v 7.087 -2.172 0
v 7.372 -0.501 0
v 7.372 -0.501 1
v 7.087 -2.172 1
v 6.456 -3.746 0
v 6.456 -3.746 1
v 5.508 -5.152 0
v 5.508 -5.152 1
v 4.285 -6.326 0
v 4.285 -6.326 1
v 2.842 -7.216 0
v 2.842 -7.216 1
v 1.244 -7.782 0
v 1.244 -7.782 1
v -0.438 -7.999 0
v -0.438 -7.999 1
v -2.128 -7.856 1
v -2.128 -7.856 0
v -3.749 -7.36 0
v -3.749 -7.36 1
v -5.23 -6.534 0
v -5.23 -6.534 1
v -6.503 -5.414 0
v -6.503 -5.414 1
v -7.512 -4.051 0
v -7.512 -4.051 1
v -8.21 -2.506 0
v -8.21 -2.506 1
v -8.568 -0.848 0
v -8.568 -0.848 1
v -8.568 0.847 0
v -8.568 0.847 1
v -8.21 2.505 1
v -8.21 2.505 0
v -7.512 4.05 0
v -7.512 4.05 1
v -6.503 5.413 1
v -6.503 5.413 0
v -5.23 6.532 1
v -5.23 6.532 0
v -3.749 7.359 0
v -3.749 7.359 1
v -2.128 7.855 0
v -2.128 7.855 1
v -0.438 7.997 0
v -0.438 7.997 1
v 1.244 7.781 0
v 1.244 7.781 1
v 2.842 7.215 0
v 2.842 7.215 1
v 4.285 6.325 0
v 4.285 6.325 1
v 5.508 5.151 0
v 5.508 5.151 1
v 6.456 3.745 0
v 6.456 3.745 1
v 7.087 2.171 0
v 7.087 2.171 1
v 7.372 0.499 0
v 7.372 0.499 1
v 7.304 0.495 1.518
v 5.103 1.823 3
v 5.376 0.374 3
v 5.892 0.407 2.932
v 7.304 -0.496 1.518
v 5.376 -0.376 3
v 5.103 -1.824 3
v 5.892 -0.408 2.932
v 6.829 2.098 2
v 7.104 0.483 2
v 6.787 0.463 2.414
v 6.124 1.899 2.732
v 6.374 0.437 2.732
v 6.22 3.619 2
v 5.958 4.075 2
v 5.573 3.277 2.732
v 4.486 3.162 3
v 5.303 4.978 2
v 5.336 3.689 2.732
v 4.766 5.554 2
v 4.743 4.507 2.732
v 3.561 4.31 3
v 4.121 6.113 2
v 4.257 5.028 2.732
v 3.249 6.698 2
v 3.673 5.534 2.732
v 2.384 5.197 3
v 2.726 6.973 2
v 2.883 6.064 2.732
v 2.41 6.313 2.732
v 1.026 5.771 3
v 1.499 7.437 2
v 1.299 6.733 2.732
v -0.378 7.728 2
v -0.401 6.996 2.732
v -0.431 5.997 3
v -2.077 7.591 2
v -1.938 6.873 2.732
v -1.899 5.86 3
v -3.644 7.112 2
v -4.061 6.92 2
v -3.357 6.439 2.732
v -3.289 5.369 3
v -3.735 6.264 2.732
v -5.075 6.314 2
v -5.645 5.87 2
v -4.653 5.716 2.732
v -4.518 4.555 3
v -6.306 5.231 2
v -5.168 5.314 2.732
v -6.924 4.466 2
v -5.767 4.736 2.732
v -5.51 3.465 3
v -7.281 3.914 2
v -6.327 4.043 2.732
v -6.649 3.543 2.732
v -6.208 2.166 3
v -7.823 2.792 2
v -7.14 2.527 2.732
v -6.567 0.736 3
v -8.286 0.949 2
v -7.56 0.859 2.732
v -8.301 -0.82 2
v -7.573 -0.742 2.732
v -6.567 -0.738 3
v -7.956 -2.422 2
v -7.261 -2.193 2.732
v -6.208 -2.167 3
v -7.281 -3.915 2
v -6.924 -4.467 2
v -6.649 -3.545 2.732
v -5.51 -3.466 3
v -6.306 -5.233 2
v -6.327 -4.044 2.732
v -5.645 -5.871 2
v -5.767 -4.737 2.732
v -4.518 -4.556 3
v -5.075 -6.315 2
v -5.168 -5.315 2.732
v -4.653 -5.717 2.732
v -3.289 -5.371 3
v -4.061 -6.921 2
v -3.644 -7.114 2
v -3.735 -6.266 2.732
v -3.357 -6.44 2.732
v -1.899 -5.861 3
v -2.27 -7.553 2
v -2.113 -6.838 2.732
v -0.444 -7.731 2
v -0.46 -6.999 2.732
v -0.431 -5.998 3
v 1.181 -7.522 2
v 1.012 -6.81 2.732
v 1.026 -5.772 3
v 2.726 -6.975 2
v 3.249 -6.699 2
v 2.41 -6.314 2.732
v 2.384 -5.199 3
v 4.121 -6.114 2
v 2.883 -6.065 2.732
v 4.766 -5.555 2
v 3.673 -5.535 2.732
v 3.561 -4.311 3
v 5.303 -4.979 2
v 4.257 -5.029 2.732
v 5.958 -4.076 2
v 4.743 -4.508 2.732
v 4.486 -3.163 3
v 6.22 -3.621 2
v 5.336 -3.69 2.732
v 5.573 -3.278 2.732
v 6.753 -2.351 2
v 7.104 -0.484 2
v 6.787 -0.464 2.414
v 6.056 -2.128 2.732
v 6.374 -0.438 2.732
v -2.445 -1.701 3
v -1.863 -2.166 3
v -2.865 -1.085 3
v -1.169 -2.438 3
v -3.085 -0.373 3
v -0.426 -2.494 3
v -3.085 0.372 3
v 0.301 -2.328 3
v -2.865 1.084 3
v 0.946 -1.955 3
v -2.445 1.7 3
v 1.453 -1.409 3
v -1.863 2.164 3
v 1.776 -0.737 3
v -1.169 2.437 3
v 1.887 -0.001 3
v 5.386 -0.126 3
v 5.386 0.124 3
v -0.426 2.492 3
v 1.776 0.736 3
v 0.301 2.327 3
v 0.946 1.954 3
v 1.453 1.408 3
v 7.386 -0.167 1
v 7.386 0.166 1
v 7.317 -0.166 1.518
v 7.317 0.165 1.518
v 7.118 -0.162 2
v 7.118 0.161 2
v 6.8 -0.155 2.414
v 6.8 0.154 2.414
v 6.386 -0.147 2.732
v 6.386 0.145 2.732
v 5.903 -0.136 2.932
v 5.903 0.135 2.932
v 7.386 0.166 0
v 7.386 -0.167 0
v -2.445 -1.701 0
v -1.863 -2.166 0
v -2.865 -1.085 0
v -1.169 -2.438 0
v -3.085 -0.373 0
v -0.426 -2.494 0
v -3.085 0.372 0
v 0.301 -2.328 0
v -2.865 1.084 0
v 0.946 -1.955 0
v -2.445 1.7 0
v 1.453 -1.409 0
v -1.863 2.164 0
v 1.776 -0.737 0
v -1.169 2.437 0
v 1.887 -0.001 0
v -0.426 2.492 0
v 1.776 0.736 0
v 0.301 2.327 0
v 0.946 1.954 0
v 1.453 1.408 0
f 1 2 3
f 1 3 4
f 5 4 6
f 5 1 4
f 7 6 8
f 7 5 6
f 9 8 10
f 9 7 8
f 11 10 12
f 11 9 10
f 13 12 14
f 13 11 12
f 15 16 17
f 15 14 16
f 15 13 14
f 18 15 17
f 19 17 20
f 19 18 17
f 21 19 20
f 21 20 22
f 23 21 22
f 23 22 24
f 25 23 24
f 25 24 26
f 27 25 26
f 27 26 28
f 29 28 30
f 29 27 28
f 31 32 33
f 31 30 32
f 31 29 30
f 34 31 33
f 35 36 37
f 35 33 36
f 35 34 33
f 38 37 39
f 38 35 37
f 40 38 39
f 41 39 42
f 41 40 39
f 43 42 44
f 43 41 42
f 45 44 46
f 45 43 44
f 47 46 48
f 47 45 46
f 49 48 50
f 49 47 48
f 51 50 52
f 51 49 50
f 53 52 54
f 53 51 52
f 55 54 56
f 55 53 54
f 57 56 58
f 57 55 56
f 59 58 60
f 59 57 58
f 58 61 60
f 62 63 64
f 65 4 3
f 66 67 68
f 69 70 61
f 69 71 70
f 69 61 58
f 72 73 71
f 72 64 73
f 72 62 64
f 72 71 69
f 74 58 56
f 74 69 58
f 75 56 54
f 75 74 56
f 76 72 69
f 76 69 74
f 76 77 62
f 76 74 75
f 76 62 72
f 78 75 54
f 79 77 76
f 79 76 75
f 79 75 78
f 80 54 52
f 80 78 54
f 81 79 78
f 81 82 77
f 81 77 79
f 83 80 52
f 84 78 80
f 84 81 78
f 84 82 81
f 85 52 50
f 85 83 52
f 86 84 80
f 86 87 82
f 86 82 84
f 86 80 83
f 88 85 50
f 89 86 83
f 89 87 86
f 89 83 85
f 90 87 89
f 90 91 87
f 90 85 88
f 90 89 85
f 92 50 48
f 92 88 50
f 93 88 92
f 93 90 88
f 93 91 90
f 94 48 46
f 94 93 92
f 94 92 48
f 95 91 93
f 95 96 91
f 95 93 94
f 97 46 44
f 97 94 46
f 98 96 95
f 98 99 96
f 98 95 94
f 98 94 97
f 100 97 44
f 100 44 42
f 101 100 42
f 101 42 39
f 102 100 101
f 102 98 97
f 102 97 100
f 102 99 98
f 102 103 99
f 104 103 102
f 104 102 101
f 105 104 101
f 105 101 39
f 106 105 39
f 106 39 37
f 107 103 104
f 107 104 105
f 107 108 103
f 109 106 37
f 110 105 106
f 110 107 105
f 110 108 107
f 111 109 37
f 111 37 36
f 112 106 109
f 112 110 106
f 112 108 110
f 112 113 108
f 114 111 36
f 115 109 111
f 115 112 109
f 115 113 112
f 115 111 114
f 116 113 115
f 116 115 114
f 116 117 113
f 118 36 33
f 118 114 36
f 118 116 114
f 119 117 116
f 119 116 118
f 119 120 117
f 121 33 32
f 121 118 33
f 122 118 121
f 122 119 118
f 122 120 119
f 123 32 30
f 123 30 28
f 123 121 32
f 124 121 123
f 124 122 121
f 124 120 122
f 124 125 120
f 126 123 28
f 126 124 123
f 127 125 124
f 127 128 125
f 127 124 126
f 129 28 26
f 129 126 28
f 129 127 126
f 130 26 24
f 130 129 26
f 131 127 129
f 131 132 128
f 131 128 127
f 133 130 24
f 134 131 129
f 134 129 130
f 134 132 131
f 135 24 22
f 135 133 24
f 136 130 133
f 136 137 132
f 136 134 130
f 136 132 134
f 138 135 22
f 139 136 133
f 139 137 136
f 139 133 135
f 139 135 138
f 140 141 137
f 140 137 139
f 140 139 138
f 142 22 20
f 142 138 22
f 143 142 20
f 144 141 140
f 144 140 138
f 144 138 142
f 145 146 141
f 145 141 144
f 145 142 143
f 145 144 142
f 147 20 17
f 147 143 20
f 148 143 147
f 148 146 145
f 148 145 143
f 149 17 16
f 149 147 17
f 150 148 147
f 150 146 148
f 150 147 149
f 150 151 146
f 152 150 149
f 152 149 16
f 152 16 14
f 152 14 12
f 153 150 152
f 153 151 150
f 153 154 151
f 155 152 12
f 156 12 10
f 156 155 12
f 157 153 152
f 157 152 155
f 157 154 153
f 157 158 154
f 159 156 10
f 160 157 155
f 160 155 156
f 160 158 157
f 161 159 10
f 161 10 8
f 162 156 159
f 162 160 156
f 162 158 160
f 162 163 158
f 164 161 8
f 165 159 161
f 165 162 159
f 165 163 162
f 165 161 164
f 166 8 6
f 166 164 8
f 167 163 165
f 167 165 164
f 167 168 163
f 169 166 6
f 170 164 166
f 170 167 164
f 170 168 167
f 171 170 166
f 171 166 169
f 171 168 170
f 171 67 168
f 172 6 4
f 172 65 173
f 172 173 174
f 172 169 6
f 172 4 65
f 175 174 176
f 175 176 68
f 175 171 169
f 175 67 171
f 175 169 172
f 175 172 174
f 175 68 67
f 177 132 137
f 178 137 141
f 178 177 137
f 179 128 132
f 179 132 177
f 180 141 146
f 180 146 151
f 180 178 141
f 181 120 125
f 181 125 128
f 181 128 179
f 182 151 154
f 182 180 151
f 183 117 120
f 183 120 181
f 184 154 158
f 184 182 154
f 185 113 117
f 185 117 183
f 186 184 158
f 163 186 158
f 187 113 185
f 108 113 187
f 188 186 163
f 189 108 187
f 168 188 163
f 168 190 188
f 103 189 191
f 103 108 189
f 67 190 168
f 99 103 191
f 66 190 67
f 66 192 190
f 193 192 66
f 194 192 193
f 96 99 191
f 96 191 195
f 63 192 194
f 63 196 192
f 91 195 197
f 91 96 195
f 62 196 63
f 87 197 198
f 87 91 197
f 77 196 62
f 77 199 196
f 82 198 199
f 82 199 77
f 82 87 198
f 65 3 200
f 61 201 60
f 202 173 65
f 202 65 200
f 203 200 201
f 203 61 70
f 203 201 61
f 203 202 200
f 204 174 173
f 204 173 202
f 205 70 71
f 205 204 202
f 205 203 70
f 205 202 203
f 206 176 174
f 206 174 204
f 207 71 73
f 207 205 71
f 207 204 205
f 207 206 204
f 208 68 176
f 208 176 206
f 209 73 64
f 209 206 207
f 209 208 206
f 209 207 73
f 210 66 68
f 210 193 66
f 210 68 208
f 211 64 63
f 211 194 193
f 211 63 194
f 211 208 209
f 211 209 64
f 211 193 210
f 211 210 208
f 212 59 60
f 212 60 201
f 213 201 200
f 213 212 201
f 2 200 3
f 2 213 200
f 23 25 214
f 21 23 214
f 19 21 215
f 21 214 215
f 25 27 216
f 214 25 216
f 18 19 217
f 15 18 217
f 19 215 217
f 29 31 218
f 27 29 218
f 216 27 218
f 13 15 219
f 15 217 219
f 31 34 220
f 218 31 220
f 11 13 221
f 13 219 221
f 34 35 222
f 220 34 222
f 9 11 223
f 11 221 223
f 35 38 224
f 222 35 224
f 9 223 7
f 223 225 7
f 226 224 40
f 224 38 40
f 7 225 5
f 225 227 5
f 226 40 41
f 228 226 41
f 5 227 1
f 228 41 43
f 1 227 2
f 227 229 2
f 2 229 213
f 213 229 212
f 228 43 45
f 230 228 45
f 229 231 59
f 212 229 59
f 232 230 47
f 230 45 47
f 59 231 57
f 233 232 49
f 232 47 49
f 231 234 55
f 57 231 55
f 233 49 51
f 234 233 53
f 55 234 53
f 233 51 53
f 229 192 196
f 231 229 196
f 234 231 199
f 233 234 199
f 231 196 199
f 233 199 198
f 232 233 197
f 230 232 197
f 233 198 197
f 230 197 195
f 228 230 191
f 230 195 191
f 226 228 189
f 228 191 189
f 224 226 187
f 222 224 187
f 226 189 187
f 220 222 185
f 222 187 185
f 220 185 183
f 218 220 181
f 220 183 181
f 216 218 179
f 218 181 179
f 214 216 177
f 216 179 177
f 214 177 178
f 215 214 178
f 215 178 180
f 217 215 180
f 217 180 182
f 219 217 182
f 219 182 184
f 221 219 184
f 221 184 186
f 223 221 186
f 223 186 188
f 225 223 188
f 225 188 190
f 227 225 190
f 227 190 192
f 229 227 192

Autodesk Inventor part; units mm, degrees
ref_plane "YZ Plane" through (0, 0, 0) normal (1, 0, 0) x (0, 1, 0)
ref_plane "XZ Plane" through (0, 0, 0) normal (0, 1, 0) x (-1, 0, 0)
ref_plane "XY Plane" through (0, 0, 0) normal (0, 0, 1) x (1, 0, 0)
sketch "Эскиз1" plane through (0, 0, 0) normal (0, 0, 1) x (1, 0, 0)
  line L0 (-4.0768, 1.9994) -> (-0.6127, 3.9994) projected
  line L1 (-0.6127, 3.9994) -> (2.8514, 1.9994) projected
  line L2 (2.8514, 1.9994) -> (2.8353, 0.4994) projected
  line L3 (2.8353, 0.4994) -> (7.3716, 0.4994) projected
  arc A0 (7.3716, 0.4994) -> (7.3716, -0.5006) centre (-0.6127, -0.0006) ccw projected
  line L4 (7.3716, -0.5006) -> (2.8246, -0.5006) projected
  line L5 (2.8246, -0.5006) -> (2.8082, -2.0255) projected
  line L6 (2.8082, -2.0255) -> (-0.6127, -4.0006) projected
  line L7 (-0.6127, -4.0006) -> (-4.0768, -2.0006) projected
  line L8 (-4.0768, -2.0006) -> (-4.0768, 1.9994) projected
  circle A1 centre (-0.6127, -0.0006) radius 8
  point P0 (0, 0)
extrude "Выдавливание1" add sketch "Эскиз1" along normal blind 3
fillet "Сопряжение1" radius 2 1 edges at (-8.6127, -0.0006, 3)
sketch "Эскиз2" plane through (-0.6127, -0.0006, 3) normal (0, 0, 1) x (1, 0, 0)
  circle A0 centre (0, 0) radius 2.5
  point P0 (0.6127, 0.0006)
  dimension "d3" = 5
extrude "Выдавливание2" cut sketch "Эскиз2" against normal blind 3
properties part number "SecindaryCap"
